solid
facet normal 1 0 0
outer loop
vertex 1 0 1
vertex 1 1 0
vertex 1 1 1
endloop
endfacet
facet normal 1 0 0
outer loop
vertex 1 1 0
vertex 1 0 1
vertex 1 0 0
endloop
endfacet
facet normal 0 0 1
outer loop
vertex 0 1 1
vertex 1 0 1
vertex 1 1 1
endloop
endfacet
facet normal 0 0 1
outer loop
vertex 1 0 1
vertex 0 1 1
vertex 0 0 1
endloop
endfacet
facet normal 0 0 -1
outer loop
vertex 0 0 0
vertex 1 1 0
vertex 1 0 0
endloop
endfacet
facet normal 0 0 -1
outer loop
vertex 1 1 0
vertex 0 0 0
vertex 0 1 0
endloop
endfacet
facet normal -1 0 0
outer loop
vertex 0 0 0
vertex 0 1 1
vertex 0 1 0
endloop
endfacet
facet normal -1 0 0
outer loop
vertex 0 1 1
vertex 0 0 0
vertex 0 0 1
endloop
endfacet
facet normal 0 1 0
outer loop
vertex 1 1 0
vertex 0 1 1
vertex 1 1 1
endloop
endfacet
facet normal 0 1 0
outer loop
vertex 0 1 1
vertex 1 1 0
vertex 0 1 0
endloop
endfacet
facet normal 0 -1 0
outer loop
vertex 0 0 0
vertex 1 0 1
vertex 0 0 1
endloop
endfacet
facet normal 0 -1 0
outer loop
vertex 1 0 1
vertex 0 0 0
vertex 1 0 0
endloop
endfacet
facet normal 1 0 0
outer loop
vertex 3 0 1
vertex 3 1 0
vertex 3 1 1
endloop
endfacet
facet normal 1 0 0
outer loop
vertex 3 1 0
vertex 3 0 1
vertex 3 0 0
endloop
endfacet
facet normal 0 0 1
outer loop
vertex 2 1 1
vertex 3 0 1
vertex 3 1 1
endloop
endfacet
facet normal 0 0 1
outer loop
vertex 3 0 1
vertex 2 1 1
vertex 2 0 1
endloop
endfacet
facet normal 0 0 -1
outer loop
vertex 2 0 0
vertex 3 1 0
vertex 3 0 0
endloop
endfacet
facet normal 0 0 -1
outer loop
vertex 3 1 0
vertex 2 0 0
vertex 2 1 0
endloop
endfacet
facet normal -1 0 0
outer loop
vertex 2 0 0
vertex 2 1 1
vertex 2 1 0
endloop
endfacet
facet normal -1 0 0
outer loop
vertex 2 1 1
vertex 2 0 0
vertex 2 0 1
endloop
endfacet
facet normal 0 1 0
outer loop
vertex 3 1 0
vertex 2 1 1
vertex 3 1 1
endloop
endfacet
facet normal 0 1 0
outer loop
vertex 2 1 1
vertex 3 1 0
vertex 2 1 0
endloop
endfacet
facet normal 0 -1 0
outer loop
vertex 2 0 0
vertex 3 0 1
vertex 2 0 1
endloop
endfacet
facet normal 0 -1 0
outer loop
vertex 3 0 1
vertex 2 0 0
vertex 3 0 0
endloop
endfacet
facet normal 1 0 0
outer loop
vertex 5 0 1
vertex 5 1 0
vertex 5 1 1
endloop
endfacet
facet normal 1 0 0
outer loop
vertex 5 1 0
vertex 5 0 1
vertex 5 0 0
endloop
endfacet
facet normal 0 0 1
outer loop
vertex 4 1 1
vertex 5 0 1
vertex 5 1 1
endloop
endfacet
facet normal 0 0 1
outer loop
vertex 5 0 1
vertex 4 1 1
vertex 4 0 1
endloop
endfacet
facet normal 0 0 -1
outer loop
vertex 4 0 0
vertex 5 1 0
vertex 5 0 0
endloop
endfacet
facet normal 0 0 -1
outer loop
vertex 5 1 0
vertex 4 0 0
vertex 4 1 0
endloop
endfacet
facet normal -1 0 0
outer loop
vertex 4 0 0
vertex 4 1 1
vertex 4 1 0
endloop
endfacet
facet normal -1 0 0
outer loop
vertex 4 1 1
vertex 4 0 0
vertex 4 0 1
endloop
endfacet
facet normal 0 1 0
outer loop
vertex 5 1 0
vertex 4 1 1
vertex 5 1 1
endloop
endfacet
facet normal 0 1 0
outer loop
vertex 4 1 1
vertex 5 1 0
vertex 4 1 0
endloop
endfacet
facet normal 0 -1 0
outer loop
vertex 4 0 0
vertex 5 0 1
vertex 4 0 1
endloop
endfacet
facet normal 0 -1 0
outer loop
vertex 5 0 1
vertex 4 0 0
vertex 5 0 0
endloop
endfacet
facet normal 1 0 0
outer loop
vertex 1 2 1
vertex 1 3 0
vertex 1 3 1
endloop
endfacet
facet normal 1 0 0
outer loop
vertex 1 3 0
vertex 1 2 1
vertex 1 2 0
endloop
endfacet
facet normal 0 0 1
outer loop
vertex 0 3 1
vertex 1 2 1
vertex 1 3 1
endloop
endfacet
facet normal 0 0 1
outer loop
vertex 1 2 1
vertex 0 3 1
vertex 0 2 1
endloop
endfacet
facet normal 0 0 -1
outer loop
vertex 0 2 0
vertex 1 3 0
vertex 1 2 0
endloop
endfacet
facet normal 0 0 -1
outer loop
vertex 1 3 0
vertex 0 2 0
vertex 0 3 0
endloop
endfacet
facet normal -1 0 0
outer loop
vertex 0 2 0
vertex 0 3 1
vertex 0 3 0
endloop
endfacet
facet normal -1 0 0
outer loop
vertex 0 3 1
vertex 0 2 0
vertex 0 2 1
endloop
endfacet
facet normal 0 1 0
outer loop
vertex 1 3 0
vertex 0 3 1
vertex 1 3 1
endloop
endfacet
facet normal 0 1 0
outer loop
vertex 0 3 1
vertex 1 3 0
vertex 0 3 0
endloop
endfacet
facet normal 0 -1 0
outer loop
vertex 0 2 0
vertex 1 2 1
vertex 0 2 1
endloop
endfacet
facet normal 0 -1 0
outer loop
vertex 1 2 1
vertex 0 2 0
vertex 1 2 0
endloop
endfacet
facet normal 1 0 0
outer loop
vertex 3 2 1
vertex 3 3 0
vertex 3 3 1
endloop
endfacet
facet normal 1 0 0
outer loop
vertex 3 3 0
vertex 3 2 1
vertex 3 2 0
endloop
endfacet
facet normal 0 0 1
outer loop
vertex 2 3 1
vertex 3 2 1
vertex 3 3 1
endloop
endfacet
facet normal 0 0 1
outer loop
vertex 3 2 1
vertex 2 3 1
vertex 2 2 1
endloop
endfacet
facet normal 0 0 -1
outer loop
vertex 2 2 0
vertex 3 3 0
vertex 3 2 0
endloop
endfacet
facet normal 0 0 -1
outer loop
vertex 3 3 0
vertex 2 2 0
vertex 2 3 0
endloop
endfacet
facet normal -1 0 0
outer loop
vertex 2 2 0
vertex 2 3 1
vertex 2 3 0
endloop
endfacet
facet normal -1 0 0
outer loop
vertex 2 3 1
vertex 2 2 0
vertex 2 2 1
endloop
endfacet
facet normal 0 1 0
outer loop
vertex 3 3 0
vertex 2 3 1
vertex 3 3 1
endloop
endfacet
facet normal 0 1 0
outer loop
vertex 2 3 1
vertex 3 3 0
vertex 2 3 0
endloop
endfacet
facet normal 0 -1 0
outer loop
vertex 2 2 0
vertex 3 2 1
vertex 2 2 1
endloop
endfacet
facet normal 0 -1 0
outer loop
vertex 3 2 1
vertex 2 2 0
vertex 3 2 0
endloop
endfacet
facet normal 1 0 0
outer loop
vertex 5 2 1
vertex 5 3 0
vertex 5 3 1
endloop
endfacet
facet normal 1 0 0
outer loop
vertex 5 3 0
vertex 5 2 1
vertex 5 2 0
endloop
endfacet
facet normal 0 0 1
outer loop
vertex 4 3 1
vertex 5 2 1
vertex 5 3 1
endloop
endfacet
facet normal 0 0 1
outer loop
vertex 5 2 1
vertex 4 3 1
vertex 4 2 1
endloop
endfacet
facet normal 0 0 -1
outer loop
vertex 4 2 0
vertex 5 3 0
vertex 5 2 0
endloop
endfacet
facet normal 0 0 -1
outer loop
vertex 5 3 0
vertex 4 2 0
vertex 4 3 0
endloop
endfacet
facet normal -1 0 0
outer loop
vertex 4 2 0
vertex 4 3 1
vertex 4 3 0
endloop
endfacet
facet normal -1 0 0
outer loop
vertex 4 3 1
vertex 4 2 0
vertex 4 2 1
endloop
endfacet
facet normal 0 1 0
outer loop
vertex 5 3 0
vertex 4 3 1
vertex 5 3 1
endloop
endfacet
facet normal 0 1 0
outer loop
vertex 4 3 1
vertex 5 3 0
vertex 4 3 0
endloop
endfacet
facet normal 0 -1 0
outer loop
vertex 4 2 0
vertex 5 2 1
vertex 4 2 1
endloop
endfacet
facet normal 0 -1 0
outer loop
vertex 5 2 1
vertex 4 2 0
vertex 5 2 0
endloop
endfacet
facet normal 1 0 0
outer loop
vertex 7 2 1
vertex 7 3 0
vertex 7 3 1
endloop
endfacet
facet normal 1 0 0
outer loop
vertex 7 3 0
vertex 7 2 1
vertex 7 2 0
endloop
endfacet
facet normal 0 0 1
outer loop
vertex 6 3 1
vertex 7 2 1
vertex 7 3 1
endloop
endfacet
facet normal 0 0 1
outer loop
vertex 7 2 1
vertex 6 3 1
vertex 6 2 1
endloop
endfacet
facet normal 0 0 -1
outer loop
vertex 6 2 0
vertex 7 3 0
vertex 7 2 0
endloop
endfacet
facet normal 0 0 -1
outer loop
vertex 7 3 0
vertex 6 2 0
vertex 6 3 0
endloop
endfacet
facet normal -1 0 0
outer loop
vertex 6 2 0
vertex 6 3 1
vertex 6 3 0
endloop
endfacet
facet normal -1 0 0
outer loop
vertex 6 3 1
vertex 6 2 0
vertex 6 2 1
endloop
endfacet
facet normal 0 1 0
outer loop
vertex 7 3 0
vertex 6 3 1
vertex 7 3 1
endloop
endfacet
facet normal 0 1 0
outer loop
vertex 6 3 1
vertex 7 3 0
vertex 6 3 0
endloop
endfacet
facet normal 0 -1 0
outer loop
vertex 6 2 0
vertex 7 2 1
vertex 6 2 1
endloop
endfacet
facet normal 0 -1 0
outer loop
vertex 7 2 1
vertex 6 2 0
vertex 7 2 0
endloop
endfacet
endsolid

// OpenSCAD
// Issue 6456 was that an empty group() was erroneously
// pruned out of some expressions where it was necessary for
// correct semantics.  This led to erroneous cache matches.

// We test here for erroneous matches in known cases.
// Note that we cannor directly test for erroneous
// mismatches, because a cache mismatch simply means that
// we unnecessarily process the subtree again, with the
// same result.

// One might think that the render() calls are unnecessary
// if you test with a render rather than a preview, but
// for not-yet-investigated reasons removing the first
// render() in a set causes the bad cases to succeed even on
// builds where the bug is present.

// Test set 1:  difference
// Setup:  a cube that is the only child of a difference.
translate([0,0,0]) {
    render() {
        difference() {
            cube();
        }
    }
}
// Test 1A:  difference a cube from an empty group.
// The result should be empty, but with 6456 the group()
// is erroneously pruned from the cache key, and as a
// result this subtree matches teh cube above and that
// cached cube is added to the model.
translate([2,0,0]) {
    render() {
        difference() {
            group();
            cube();
        }
    }
}

// Test 1B:  As for test 1A, but with the first child being
// a two-level empty group.  It seems unlikely that a bug
// would erroneously prune a more complex structure while
// leaving a trivial empty group() alone, but it's easy
// to test.
translate([4,0,0]) {
    render() {
        difference() {
            group() group();
            cube();
        }
    }
}

// Test set 2:  intersection
// Setup:  a cube that is the only child of an intersection.
translate([0,2,0]) {
    render() {
        intersection() {
            cube();
        }
    }
}

// Test 2A:  intersect an empty group with a cube.
// This should yield an empty result, but as above with the
// bug in place the group() is pruned out and as a result
// this subtree matches the setup cube above and that cube
// is added to the model.
translate([2,2,0]) {
    render() {
        intersection() {
            group();
            cube();
        }
    }
}

// Test 2B:  As for 2A above, test with a two-level empty
// group().
translate([4,2,0]) {
    render() {
        intersection() {
            group() group();
            cube();
        }
    }
}

// Test 2C:  Reverse the order of the children.
translate([6,2,0]) {
    render() {
        intersection() {
            cube();
            group();
        }
    }
}
